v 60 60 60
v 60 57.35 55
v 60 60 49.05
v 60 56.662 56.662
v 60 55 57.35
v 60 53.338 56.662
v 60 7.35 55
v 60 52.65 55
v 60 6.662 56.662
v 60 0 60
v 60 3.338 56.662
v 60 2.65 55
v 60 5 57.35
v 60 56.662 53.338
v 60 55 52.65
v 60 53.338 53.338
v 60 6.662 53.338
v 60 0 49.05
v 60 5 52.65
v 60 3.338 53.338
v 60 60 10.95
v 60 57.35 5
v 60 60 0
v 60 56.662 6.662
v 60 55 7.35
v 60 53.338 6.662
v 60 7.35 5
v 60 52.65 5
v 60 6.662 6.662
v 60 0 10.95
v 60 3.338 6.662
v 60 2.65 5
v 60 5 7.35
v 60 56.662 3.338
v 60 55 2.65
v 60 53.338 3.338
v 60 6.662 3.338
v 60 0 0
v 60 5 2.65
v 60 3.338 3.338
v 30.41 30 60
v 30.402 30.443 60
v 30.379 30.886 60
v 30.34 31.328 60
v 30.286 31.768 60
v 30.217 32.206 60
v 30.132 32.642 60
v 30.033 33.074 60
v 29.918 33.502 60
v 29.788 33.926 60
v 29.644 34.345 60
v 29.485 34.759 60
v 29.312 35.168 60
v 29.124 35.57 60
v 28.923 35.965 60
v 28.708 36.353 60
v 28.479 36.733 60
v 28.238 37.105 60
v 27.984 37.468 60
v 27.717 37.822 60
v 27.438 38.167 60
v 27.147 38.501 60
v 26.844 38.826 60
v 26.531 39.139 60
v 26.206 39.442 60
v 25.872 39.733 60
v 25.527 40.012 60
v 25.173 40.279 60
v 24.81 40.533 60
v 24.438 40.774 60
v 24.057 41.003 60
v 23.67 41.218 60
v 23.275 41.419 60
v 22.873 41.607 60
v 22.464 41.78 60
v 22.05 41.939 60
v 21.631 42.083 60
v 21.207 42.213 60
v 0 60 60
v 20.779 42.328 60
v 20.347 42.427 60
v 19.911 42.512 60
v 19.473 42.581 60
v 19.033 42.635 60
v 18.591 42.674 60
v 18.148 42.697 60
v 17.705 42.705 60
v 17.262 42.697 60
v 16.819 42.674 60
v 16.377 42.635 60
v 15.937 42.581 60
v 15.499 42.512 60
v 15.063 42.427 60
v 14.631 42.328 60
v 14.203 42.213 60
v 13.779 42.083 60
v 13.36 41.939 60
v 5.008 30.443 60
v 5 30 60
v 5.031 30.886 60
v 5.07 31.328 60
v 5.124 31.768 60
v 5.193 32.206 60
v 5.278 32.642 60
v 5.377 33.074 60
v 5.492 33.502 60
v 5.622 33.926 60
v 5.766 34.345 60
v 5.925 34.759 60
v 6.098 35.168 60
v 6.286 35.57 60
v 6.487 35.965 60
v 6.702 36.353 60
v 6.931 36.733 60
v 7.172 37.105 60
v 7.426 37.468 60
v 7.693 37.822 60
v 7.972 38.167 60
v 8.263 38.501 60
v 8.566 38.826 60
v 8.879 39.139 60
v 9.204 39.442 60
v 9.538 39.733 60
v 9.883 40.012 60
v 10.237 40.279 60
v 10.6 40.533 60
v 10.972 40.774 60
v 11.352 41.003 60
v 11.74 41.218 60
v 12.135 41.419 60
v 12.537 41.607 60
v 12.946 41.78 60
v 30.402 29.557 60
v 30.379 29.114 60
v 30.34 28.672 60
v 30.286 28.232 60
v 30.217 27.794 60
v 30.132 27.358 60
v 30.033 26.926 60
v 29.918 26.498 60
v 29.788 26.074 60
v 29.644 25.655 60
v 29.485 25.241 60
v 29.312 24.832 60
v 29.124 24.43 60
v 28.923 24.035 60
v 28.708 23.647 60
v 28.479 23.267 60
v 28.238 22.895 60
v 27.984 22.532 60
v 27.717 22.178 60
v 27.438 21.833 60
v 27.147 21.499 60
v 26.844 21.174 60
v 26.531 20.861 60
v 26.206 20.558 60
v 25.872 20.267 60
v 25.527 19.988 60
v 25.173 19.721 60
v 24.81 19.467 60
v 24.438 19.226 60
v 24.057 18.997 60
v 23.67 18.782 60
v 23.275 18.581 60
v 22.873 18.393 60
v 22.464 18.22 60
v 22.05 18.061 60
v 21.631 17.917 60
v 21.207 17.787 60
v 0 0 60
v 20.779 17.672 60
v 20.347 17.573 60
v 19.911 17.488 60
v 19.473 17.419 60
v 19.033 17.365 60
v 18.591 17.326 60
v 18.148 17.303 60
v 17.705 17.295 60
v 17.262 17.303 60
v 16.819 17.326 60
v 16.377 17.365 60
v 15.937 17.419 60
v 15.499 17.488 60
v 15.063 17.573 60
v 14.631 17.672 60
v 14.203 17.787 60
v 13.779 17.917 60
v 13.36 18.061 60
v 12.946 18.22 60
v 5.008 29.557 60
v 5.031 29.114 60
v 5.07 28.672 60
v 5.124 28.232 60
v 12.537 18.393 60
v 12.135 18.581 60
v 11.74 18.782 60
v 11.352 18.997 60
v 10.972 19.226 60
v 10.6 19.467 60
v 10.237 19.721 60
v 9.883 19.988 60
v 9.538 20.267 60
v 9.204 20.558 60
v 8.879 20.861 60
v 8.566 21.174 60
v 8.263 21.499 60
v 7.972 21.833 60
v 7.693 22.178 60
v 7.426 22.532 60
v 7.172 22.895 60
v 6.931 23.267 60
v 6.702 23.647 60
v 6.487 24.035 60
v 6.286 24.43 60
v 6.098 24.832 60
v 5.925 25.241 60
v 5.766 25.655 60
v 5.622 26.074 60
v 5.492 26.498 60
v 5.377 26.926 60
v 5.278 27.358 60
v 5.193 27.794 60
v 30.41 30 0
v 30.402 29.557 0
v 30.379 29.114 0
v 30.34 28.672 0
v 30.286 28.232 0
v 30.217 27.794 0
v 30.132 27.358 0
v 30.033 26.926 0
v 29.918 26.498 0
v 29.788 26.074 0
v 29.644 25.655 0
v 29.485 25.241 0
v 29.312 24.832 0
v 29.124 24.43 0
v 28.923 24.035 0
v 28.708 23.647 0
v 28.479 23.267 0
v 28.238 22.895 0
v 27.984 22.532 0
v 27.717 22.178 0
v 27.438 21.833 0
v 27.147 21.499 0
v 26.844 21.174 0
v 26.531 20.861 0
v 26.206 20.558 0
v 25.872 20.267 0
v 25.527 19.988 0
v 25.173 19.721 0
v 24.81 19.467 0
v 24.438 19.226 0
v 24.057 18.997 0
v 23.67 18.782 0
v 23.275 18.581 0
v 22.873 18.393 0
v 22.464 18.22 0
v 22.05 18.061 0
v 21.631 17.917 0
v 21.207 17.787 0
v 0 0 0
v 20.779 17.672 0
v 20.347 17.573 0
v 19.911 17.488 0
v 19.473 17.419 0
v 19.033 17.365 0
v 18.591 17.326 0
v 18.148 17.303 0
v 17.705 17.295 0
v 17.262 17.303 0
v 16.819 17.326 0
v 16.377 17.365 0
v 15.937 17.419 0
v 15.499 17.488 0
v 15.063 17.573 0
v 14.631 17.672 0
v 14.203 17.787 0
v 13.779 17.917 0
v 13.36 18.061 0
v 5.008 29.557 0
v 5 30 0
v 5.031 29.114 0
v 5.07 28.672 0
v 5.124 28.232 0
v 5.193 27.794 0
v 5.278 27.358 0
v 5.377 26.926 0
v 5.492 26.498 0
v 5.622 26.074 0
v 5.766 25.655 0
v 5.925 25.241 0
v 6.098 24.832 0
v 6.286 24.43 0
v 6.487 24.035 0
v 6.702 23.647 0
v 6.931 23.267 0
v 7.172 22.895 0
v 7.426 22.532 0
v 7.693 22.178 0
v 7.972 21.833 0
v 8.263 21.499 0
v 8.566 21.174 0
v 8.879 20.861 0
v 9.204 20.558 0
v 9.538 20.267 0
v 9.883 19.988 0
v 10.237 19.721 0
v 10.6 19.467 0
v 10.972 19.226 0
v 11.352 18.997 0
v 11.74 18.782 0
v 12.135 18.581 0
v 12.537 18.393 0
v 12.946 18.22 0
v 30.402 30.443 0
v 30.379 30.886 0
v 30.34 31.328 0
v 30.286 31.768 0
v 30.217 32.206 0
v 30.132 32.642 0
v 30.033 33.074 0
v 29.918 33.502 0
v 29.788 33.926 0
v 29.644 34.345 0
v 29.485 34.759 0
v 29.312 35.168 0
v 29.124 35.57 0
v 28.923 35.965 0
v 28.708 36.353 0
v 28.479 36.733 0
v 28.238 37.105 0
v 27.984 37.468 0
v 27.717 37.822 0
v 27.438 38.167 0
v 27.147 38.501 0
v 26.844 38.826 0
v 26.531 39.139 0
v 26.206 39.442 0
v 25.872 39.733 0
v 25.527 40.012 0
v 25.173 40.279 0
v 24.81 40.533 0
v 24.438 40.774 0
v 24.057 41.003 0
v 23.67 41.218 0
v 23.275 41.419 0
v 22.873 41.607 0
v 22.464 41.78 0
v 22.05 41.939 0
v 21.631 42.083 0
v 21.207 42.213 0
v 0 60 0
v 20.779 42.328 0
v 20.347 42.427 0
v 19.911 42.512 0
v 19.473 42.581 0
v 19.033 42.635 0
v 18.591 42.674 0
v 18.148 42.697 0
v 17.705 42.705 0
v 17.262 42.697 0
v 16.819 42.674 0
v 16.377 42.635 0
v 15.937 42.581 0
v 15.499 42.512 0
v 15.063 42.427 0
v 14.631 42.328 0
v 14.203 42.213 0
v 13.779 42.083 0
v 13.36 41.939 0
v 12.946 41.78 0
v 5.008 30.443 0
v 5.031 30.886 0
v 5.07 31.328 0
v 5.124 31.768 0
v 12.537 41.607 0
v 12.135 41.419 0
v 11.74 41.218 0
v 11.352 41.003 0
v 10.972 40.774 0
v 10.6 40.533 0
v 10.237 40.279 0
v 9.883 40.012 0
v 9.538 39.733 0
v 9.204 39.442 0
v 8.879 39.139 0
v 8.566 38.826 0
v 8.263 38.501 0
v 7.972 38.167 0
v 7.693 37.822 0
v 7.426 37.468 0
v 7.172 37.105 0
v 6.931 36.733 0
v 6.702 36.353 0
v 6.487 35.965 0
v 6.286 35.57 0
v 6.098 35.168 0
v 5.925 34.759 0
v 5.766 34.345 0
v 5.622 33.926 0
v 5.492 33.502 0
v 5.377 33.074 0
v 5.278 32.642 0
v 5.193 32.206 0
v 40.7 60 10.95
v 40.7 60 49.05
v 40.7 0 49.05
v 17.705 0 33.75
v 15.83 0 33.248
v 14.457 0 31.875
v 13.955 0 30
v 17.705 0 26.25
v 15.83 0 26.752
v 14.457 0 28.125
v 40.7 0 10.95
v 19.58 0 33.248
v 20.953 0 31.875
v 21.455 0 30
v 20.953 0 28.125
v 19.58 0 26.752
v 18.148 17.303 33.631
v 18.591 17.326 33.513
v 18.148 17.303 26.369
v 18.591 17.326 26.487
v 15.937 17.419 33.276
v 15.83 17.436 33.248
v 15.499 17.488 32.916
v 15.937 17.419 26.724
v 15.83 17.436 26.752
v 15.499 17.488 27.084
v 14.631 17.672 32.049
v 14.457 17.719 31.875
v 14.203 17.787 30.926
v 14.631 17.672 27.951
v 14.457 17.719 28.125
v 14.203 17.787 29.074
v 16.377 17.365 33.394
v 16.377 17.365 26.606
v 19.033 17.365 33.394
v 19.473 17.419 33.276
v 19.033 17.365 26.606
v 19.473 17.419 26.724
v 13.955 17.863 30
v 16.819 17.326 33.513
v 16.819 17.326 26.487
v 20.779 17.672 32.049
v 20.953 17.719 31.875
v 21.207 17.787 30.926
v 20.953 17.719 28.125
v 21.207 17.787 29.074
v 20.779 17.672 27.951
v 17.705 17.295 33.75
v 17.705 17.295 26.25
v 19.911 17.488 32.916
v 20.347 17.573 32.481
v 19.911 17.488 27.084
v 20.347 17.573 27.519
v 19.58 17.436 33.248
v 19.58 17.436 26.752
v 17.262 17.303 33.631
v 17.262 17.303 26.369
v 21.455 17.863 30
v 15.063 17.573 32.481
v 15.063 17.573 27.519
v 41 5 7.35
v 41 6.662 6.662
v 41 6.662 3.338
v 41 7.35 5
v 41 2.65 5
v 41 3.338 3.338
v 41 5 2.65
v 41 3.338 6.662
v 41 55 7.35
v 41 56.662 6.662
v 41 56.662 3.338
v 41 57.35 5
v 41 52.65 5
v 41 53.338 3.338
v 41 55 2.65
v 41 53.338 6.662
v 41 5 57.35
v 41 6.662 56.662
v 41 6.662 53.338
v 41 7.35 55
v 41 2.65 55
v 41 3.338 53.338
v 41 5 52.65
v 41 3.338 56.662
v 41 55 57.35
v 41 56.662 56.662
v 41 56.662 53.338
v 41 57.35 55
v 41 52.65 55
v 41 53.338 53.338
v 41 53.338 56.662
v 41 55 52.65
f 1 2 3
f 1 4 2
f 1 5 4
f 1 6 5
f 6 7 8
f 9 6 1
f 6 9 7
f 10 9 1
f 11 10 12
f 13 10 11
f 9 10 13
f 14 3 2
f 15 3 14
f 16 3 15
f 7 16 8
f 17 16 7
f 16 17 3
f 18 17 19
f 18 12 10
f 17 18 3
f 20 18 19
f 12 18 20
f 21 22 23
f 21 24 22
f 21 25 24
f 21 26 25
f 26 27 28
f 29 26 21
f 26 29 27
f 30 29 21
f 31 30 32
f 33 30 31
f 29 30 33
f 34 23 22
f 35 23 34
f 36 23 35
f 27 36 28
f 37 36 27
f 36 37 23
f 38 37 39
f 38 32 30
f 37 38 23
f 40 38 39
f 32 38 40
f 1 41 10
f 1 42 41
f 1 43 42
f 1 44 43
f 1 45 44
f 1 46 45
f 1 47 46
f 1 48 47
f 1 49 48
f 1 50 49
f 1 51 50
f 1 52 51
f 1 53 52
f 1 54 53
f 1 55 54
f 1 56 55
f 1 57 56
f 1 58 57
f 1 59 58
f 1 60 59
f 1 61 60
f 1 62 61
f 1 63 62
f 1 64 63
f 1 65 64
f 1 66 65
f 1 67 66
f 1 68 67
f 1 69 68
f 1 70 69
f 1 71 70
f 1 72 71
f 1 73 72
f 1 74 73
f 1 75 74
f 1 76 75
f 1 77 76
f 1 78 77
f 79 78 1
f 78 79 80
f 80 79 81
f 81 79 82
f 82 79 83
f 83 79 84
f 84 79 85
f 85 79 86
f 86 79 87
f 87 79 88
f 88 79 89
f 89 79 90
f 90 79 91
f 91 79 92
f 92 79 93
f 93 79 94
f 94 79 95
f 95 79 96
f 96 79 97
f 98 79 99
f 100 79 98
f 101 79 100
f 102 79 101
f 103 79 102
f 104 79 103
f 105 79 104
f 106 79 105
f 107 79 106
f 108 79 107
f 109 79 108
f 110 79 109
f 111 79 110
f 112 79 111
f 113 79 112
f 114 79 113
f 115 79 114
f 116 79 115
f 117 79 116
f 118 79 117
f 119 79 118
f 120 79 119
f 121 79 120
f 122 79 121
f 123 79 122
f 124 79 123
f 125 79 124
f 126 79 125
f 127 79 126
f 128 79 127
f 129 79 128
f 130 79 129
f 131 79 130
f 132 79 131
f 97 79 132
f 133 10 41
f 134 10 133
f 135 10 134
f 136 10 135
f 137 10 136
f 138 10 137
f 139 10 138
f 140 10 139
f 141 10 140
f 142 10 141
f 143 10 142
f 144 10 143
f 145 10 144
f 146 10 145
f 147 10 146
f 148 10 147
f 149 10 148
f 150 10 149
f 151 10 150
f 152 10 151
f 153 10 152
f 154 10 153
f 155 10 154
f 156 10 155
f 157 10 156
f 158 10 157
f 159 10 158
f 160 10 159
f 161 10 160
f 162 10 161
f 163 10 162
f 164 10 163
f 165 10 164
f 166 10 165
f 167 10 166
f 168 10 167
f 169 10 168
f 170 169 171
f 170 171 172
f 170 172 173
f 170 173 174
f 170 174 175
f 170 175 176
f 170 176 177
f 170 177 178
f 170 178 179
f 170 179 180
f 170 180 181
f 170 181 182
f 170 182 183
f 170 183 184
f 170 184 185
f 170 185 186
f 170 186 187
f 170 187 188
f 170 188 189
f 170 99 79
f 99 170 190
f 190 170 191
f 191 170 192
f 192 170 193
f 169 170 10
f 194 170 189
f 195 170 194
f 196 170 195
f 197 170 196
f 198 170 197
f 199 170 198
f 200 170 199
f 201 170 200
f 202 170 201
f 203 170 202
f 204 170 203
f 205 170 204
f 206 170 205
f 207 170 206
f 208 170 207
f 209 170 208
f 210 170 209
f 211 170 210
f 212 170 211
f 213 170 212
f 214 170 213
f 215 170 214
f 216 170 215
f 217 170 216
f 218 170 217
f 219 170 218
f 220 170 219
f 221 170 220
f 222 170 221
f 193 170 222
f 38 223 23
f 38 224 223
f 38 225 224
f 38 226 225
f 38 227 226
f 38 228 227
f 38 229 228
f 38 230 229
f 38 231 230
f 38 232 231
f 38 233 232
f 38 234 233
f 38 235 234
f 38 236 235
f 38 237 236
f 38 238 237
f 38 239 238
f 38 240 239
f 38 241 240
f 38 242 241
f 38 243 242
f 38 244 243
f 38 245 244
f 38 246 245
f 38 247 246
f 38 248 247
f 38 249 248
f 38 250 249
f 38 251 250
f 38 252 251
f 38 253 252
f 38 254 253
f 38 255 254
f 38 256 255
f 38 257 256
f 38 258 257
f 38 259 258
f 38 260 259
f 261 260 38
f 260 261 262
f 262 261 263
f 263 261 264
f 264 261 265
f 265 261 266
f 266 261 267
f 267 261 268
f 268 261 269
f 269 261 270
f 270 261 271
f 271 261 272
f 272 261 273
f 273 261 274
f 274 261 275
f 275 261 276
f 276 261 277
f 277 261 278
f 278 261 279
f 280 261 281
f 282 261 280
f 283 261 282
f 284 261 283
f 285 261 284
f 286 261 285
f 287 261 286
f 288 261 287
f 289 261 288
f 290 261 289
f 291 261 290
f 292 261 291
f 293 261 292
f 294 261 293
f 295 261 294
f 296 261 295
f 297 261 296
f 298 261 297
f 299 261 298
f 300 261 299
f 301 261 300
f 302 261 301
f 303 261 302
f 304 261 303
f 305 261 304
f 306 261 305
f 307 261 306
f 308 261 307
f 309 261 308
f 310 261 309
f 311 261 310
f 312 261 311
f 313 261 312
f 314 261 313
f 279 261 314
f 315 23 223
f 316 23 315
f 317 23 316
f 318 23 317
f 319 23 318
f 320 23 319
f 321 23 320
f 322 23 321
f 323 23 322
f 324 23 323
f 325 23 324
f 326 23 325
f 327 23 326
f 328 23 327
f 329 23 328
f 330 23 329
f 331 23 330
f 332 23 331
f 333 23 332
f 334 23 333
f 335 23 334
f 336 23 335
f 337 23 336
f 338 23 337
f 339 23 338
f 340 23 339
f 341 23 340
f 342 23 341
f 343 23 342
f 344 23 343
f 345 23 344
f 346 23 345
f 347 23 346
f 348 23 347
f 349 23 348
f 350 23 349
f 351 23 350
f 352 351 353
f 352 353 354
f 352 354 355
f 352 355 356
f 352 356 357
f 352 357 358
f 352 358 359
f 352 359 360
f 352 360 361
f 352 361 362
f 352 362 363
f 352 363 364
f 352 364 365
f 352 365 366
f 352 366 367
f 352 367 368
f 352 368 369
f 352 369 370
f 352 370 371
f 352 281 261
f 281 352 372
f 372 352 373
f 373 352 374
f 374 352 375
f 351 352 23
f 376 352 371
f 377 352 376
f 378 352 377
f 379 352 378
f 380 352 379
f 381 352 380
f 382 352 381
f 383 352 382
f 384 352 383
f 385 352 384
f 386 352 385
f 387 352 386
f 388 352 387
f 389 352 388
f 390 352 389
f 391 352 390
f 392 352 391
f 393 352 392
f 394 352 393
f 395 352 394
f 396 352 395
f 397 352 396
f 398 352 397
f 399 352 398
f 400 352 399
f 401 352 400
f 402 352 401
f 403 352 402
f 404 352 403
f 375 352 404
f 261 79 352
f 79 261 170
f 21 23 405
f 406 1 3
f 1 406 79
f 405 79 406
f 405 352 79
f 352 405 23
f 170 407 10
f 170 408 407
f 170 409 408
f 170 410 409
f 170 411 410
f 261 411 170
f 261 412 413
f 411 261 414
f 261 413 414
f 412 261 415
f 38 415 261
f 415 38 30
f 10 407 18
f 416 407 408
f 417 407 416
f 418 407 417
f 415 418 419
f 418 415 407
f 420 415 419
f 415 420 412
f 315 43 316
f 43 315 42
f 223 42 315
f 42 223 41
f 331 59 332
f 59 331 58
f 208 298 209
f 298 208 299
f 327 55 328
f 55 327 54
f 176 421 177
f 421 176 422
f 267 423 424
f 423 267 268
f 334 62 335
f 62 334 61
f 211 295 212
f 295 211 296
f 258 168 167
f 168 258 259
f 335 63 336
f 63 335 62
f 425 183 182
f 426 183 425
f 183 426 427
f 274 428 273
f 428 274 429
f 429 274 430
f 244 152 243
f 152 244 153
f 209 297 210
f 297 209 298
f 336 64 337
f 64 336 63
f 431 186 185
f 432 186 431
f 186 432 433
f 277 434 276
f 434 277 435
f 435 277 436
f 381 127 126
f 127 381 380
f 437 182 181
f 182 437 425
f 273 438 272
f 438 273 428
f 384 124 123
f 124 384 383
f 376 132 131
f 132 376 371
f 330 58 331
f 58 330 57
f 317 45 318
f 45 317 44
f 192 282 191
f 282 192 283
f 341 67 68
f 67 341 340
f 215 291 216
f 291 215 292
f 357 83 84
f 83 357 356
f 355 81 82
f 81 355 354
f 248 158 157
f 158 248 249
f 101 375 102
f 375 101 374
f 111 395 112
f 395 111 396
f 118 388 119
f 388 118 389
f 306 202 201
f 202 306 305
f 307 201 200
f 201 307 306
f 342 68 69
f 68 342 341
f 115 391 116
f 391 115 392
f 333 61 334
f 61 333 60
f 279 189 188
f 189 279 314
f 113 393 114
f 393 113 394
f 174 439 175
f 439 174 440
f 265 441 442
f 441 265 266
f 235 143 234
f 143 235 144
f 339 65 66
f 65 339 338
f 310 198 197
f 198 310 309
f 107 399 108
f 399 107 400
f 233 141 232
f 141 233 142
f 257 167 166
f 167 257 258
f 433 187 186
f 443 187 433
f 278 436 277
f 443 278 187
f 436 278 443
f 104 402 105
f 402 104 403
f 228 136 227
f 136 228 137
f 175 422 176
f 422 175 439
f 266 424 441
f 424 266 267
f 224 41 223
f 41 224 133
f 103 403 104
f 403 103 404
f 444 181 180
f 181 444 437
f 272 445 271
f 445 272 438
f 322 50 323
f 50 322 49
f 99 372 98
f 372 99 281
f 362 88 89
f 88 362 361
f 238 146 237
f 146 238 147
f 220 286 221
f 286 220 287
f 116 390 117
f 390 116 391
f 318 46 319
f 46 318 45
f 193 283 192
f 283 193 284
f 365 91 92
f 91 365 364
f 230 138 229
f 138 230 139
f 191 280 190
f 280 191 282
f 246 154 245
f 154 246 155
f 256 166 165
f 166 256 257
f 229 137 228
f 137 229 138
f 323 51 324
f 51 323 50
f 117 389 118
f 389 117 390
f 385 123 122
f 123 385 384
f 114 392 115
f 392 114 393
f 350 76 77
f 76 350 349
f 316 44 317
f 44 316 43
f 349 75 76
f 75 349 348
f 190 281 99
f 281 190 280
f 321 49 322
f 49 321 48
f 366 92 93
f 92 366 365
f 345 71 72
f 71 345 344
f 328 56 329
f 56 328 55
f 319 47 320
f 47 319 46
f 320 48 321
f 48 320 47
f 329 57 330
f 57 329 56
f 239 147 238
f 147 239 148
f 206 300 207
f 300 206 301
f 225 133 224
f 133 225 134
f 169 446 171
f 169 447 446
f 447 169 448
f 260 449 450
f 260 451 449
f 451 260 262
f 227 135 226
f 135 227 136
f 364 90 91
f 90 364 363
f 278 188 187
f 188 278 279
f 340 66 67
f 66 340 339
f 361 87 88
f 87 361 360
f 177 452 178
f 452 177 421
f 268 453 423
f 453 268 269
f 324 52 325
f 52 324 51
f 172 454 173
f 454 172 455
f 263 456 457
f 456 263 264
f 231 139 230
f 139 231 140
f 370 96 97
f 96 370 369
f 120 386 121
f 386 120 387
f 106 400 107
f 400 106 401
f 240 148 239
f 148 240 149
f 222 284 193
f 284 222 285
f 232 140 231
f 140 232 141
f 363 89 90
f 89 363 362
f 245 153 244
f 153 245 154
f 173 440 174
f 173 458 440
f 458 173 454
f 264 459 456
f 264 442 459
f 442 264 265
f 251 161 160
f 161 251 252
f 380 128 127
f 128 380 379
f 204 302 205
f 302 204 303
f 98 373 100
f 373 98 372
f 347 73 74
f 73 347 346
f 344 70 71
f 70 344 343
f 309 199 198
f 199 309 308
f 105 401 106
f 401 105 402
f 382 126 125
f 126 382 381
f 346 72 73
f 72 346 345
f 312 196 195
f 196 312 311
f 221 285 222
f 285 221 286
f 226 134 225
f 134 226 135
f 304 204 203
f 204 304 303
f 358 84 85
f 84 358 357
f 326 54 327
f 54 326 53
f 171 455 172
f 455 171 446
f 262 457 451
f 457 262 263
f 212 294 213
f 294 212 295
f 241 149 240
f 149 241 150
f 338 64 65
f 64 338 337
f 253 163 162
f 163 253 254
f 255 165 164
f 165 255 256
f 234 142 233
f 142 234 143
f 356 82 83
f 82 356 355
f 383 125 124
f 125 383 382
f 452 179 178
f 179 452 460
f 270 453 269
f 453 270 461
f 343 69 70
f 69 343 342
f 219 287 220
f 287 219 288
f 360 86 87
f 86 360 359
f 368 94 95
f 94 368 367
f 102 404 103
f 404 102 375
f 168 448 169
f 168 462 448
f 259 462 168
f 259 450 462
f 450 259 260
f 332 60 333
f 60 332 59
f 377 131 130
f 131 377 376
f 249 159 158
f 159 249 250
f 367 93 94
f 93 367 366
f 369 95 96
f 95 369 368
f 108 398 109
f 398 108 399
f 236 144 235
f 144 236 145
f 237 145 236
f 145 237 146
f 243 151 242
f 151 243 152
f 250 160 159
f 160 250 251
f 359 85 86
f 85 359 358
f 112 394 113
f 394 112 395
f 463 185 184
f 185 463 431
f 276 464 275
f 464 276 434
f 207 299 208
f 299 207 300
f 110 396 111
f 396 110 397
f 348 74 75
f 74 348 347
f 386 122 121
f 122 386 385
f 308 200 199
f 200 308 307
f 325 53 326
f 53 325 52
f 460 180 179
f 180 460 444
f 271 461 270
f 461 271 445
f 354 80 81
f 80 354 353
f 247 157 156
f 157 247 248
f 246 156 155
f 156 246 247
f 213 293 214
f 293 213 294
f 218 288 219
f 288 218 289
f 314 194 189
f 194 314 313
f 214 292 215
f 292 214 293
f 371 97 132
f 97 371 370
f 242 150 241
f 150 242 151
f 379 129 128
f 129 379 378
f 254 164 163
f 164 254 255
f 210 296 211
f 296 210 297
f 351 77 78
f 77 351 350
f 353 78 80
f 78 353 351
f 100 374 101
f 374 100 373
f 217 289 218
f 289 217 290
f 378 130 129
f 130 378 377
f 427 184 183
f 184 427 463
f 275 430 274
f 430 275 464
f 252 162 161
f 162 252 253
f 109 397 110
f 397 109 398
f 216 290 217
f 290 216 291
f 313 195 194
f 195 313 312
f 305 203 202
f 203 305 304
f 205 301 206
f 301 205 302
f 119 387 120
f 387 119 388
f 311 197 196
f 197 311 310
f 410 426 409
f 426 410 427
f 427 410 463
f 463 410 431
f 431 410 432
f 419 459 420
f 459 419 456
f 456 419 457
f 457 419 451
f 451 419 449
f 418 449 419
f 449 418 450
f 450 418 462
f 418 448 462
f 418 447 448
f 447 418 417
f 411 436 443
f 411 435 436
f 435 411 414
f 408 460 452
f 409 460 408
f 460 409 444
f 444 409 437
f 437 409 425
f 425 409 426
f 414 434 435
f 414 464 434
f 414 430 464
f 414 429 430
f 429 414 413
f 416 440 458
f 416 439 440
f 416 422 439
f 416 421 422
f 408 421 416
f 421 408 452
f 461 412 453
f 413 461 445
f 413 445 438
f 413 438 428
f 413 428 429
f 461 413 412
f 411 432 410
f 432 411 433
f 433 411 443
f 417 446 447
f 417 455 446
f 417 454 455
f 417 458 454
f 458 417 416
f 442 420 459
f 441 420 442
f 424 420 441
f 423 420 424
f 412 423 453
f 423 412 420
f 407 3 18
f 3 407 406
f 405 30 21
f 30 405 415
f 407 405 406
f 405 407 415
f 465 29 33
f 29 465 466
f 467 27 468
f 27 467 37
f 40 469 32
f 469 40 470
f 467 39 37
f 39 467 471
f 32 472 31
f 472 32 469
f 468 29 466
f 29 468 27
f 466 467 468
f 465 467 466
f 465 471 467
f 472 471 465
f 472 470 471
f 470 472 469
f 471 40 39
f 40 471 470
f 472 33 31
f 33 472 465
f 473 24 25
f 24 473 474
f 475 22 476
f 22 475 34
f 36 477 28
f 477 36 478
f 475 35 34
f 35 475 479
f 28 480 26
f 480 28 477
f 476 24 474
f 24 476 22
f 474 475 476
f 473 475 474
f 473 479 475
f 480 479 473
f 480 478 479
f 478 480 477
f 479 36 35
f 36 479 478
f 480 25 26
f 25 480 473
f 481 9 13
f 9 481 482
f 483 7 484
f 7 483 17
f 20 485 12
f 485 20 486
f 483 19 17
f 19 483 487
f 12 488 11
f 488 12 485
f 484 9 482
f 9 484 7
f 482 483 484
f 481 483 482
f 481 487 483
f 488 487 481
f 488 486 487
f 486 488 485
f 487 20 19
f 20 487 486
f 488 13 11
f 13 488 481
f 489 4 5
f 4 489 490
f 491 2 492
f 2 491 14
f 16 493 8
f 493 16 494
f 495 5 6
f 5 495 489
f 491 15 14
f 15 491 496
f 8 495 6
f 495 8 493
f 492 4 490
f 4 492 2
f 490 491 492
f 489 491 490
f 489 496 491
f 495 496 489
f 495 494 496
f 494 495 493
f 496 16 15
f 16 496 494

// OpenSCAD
bx=60; //body x
by=60;
bz=60;
hd=25.41; //hole diameter
hz=bz+2;
ax=19.3; // arm x
ay=2*by;
az=38.1;

lsd=7.5; //large screw diameter
lsh=25;
ssd=4.7; //small screw diameter
ssh=20;
ssnd=5.1; //small screw diameter
cz=5; //cover thickness


module armMount(){
    difference(){
        cube([bx,by,bz]);
        
        //hole
        translate([ 5+(hd/2),(by/2),0-((hz-bz)/2)]){
            cylinder(d=hd,h=hz,$fn=180);
        }
        //screw for hole
        translate([ 5+(hd/2),-1,bz/2]){
            rotate([-90,0,0]){
                cylinder(d=lsd,h=lsh);
            }
        }
        
        translate([bx-ax,0-(ay-by)/2,(bz-az)/2]){
            cube([ax,ay,az]);
        }
        
        //screw for hole bottom front
        translate([ bx+1,5,5]){
            rotate([0,-90,0]){
                cylinder(d=ssd,h=ssh);
            }
        }
        
        //screw for hole bottom back
        translate([ bx+1,by-5,5]){
            rotate([0,-90,0]){
                cylinder(d=ssd,h=ssh);
            }
        }
        //screw for hole top front
        translate([ bx+1,5,bz-5]){
            rotate([0,-90,0]){
                cylinder(d=ssd,h=ssh);
            }
        }
        
        //screw for hole top back
        translate([ bx+1,by-5,bz-5]){
            rotate([0,-90,0]){
                cylinder(d=ssd,h=ssh);
            }
        }
    }
}

module armMountPlate(){
    difference(){
        cube([bz,by,cz]);
       
        //screw for hole bottom front
        translate([ 5,5,-1]){
                cylinder(d=ssnd,h=ssh);
        }
        
        //screw for hole bottom back
        translate([ 5,by-5,-1]){
                cylinder(d=ssnd,h=ssh);
        }
        //screw for hole top front
        translate([ bz-5,5,-1]){
                cylinder(d=ssnd,h=ssh);
        }
        
        //screw for hole top back
        translate([ bz-5,by-5,-1]){
                cylinder(d=ssnd,h=ssh);
        }

    }
}
//armMountPlate();
armMount();
